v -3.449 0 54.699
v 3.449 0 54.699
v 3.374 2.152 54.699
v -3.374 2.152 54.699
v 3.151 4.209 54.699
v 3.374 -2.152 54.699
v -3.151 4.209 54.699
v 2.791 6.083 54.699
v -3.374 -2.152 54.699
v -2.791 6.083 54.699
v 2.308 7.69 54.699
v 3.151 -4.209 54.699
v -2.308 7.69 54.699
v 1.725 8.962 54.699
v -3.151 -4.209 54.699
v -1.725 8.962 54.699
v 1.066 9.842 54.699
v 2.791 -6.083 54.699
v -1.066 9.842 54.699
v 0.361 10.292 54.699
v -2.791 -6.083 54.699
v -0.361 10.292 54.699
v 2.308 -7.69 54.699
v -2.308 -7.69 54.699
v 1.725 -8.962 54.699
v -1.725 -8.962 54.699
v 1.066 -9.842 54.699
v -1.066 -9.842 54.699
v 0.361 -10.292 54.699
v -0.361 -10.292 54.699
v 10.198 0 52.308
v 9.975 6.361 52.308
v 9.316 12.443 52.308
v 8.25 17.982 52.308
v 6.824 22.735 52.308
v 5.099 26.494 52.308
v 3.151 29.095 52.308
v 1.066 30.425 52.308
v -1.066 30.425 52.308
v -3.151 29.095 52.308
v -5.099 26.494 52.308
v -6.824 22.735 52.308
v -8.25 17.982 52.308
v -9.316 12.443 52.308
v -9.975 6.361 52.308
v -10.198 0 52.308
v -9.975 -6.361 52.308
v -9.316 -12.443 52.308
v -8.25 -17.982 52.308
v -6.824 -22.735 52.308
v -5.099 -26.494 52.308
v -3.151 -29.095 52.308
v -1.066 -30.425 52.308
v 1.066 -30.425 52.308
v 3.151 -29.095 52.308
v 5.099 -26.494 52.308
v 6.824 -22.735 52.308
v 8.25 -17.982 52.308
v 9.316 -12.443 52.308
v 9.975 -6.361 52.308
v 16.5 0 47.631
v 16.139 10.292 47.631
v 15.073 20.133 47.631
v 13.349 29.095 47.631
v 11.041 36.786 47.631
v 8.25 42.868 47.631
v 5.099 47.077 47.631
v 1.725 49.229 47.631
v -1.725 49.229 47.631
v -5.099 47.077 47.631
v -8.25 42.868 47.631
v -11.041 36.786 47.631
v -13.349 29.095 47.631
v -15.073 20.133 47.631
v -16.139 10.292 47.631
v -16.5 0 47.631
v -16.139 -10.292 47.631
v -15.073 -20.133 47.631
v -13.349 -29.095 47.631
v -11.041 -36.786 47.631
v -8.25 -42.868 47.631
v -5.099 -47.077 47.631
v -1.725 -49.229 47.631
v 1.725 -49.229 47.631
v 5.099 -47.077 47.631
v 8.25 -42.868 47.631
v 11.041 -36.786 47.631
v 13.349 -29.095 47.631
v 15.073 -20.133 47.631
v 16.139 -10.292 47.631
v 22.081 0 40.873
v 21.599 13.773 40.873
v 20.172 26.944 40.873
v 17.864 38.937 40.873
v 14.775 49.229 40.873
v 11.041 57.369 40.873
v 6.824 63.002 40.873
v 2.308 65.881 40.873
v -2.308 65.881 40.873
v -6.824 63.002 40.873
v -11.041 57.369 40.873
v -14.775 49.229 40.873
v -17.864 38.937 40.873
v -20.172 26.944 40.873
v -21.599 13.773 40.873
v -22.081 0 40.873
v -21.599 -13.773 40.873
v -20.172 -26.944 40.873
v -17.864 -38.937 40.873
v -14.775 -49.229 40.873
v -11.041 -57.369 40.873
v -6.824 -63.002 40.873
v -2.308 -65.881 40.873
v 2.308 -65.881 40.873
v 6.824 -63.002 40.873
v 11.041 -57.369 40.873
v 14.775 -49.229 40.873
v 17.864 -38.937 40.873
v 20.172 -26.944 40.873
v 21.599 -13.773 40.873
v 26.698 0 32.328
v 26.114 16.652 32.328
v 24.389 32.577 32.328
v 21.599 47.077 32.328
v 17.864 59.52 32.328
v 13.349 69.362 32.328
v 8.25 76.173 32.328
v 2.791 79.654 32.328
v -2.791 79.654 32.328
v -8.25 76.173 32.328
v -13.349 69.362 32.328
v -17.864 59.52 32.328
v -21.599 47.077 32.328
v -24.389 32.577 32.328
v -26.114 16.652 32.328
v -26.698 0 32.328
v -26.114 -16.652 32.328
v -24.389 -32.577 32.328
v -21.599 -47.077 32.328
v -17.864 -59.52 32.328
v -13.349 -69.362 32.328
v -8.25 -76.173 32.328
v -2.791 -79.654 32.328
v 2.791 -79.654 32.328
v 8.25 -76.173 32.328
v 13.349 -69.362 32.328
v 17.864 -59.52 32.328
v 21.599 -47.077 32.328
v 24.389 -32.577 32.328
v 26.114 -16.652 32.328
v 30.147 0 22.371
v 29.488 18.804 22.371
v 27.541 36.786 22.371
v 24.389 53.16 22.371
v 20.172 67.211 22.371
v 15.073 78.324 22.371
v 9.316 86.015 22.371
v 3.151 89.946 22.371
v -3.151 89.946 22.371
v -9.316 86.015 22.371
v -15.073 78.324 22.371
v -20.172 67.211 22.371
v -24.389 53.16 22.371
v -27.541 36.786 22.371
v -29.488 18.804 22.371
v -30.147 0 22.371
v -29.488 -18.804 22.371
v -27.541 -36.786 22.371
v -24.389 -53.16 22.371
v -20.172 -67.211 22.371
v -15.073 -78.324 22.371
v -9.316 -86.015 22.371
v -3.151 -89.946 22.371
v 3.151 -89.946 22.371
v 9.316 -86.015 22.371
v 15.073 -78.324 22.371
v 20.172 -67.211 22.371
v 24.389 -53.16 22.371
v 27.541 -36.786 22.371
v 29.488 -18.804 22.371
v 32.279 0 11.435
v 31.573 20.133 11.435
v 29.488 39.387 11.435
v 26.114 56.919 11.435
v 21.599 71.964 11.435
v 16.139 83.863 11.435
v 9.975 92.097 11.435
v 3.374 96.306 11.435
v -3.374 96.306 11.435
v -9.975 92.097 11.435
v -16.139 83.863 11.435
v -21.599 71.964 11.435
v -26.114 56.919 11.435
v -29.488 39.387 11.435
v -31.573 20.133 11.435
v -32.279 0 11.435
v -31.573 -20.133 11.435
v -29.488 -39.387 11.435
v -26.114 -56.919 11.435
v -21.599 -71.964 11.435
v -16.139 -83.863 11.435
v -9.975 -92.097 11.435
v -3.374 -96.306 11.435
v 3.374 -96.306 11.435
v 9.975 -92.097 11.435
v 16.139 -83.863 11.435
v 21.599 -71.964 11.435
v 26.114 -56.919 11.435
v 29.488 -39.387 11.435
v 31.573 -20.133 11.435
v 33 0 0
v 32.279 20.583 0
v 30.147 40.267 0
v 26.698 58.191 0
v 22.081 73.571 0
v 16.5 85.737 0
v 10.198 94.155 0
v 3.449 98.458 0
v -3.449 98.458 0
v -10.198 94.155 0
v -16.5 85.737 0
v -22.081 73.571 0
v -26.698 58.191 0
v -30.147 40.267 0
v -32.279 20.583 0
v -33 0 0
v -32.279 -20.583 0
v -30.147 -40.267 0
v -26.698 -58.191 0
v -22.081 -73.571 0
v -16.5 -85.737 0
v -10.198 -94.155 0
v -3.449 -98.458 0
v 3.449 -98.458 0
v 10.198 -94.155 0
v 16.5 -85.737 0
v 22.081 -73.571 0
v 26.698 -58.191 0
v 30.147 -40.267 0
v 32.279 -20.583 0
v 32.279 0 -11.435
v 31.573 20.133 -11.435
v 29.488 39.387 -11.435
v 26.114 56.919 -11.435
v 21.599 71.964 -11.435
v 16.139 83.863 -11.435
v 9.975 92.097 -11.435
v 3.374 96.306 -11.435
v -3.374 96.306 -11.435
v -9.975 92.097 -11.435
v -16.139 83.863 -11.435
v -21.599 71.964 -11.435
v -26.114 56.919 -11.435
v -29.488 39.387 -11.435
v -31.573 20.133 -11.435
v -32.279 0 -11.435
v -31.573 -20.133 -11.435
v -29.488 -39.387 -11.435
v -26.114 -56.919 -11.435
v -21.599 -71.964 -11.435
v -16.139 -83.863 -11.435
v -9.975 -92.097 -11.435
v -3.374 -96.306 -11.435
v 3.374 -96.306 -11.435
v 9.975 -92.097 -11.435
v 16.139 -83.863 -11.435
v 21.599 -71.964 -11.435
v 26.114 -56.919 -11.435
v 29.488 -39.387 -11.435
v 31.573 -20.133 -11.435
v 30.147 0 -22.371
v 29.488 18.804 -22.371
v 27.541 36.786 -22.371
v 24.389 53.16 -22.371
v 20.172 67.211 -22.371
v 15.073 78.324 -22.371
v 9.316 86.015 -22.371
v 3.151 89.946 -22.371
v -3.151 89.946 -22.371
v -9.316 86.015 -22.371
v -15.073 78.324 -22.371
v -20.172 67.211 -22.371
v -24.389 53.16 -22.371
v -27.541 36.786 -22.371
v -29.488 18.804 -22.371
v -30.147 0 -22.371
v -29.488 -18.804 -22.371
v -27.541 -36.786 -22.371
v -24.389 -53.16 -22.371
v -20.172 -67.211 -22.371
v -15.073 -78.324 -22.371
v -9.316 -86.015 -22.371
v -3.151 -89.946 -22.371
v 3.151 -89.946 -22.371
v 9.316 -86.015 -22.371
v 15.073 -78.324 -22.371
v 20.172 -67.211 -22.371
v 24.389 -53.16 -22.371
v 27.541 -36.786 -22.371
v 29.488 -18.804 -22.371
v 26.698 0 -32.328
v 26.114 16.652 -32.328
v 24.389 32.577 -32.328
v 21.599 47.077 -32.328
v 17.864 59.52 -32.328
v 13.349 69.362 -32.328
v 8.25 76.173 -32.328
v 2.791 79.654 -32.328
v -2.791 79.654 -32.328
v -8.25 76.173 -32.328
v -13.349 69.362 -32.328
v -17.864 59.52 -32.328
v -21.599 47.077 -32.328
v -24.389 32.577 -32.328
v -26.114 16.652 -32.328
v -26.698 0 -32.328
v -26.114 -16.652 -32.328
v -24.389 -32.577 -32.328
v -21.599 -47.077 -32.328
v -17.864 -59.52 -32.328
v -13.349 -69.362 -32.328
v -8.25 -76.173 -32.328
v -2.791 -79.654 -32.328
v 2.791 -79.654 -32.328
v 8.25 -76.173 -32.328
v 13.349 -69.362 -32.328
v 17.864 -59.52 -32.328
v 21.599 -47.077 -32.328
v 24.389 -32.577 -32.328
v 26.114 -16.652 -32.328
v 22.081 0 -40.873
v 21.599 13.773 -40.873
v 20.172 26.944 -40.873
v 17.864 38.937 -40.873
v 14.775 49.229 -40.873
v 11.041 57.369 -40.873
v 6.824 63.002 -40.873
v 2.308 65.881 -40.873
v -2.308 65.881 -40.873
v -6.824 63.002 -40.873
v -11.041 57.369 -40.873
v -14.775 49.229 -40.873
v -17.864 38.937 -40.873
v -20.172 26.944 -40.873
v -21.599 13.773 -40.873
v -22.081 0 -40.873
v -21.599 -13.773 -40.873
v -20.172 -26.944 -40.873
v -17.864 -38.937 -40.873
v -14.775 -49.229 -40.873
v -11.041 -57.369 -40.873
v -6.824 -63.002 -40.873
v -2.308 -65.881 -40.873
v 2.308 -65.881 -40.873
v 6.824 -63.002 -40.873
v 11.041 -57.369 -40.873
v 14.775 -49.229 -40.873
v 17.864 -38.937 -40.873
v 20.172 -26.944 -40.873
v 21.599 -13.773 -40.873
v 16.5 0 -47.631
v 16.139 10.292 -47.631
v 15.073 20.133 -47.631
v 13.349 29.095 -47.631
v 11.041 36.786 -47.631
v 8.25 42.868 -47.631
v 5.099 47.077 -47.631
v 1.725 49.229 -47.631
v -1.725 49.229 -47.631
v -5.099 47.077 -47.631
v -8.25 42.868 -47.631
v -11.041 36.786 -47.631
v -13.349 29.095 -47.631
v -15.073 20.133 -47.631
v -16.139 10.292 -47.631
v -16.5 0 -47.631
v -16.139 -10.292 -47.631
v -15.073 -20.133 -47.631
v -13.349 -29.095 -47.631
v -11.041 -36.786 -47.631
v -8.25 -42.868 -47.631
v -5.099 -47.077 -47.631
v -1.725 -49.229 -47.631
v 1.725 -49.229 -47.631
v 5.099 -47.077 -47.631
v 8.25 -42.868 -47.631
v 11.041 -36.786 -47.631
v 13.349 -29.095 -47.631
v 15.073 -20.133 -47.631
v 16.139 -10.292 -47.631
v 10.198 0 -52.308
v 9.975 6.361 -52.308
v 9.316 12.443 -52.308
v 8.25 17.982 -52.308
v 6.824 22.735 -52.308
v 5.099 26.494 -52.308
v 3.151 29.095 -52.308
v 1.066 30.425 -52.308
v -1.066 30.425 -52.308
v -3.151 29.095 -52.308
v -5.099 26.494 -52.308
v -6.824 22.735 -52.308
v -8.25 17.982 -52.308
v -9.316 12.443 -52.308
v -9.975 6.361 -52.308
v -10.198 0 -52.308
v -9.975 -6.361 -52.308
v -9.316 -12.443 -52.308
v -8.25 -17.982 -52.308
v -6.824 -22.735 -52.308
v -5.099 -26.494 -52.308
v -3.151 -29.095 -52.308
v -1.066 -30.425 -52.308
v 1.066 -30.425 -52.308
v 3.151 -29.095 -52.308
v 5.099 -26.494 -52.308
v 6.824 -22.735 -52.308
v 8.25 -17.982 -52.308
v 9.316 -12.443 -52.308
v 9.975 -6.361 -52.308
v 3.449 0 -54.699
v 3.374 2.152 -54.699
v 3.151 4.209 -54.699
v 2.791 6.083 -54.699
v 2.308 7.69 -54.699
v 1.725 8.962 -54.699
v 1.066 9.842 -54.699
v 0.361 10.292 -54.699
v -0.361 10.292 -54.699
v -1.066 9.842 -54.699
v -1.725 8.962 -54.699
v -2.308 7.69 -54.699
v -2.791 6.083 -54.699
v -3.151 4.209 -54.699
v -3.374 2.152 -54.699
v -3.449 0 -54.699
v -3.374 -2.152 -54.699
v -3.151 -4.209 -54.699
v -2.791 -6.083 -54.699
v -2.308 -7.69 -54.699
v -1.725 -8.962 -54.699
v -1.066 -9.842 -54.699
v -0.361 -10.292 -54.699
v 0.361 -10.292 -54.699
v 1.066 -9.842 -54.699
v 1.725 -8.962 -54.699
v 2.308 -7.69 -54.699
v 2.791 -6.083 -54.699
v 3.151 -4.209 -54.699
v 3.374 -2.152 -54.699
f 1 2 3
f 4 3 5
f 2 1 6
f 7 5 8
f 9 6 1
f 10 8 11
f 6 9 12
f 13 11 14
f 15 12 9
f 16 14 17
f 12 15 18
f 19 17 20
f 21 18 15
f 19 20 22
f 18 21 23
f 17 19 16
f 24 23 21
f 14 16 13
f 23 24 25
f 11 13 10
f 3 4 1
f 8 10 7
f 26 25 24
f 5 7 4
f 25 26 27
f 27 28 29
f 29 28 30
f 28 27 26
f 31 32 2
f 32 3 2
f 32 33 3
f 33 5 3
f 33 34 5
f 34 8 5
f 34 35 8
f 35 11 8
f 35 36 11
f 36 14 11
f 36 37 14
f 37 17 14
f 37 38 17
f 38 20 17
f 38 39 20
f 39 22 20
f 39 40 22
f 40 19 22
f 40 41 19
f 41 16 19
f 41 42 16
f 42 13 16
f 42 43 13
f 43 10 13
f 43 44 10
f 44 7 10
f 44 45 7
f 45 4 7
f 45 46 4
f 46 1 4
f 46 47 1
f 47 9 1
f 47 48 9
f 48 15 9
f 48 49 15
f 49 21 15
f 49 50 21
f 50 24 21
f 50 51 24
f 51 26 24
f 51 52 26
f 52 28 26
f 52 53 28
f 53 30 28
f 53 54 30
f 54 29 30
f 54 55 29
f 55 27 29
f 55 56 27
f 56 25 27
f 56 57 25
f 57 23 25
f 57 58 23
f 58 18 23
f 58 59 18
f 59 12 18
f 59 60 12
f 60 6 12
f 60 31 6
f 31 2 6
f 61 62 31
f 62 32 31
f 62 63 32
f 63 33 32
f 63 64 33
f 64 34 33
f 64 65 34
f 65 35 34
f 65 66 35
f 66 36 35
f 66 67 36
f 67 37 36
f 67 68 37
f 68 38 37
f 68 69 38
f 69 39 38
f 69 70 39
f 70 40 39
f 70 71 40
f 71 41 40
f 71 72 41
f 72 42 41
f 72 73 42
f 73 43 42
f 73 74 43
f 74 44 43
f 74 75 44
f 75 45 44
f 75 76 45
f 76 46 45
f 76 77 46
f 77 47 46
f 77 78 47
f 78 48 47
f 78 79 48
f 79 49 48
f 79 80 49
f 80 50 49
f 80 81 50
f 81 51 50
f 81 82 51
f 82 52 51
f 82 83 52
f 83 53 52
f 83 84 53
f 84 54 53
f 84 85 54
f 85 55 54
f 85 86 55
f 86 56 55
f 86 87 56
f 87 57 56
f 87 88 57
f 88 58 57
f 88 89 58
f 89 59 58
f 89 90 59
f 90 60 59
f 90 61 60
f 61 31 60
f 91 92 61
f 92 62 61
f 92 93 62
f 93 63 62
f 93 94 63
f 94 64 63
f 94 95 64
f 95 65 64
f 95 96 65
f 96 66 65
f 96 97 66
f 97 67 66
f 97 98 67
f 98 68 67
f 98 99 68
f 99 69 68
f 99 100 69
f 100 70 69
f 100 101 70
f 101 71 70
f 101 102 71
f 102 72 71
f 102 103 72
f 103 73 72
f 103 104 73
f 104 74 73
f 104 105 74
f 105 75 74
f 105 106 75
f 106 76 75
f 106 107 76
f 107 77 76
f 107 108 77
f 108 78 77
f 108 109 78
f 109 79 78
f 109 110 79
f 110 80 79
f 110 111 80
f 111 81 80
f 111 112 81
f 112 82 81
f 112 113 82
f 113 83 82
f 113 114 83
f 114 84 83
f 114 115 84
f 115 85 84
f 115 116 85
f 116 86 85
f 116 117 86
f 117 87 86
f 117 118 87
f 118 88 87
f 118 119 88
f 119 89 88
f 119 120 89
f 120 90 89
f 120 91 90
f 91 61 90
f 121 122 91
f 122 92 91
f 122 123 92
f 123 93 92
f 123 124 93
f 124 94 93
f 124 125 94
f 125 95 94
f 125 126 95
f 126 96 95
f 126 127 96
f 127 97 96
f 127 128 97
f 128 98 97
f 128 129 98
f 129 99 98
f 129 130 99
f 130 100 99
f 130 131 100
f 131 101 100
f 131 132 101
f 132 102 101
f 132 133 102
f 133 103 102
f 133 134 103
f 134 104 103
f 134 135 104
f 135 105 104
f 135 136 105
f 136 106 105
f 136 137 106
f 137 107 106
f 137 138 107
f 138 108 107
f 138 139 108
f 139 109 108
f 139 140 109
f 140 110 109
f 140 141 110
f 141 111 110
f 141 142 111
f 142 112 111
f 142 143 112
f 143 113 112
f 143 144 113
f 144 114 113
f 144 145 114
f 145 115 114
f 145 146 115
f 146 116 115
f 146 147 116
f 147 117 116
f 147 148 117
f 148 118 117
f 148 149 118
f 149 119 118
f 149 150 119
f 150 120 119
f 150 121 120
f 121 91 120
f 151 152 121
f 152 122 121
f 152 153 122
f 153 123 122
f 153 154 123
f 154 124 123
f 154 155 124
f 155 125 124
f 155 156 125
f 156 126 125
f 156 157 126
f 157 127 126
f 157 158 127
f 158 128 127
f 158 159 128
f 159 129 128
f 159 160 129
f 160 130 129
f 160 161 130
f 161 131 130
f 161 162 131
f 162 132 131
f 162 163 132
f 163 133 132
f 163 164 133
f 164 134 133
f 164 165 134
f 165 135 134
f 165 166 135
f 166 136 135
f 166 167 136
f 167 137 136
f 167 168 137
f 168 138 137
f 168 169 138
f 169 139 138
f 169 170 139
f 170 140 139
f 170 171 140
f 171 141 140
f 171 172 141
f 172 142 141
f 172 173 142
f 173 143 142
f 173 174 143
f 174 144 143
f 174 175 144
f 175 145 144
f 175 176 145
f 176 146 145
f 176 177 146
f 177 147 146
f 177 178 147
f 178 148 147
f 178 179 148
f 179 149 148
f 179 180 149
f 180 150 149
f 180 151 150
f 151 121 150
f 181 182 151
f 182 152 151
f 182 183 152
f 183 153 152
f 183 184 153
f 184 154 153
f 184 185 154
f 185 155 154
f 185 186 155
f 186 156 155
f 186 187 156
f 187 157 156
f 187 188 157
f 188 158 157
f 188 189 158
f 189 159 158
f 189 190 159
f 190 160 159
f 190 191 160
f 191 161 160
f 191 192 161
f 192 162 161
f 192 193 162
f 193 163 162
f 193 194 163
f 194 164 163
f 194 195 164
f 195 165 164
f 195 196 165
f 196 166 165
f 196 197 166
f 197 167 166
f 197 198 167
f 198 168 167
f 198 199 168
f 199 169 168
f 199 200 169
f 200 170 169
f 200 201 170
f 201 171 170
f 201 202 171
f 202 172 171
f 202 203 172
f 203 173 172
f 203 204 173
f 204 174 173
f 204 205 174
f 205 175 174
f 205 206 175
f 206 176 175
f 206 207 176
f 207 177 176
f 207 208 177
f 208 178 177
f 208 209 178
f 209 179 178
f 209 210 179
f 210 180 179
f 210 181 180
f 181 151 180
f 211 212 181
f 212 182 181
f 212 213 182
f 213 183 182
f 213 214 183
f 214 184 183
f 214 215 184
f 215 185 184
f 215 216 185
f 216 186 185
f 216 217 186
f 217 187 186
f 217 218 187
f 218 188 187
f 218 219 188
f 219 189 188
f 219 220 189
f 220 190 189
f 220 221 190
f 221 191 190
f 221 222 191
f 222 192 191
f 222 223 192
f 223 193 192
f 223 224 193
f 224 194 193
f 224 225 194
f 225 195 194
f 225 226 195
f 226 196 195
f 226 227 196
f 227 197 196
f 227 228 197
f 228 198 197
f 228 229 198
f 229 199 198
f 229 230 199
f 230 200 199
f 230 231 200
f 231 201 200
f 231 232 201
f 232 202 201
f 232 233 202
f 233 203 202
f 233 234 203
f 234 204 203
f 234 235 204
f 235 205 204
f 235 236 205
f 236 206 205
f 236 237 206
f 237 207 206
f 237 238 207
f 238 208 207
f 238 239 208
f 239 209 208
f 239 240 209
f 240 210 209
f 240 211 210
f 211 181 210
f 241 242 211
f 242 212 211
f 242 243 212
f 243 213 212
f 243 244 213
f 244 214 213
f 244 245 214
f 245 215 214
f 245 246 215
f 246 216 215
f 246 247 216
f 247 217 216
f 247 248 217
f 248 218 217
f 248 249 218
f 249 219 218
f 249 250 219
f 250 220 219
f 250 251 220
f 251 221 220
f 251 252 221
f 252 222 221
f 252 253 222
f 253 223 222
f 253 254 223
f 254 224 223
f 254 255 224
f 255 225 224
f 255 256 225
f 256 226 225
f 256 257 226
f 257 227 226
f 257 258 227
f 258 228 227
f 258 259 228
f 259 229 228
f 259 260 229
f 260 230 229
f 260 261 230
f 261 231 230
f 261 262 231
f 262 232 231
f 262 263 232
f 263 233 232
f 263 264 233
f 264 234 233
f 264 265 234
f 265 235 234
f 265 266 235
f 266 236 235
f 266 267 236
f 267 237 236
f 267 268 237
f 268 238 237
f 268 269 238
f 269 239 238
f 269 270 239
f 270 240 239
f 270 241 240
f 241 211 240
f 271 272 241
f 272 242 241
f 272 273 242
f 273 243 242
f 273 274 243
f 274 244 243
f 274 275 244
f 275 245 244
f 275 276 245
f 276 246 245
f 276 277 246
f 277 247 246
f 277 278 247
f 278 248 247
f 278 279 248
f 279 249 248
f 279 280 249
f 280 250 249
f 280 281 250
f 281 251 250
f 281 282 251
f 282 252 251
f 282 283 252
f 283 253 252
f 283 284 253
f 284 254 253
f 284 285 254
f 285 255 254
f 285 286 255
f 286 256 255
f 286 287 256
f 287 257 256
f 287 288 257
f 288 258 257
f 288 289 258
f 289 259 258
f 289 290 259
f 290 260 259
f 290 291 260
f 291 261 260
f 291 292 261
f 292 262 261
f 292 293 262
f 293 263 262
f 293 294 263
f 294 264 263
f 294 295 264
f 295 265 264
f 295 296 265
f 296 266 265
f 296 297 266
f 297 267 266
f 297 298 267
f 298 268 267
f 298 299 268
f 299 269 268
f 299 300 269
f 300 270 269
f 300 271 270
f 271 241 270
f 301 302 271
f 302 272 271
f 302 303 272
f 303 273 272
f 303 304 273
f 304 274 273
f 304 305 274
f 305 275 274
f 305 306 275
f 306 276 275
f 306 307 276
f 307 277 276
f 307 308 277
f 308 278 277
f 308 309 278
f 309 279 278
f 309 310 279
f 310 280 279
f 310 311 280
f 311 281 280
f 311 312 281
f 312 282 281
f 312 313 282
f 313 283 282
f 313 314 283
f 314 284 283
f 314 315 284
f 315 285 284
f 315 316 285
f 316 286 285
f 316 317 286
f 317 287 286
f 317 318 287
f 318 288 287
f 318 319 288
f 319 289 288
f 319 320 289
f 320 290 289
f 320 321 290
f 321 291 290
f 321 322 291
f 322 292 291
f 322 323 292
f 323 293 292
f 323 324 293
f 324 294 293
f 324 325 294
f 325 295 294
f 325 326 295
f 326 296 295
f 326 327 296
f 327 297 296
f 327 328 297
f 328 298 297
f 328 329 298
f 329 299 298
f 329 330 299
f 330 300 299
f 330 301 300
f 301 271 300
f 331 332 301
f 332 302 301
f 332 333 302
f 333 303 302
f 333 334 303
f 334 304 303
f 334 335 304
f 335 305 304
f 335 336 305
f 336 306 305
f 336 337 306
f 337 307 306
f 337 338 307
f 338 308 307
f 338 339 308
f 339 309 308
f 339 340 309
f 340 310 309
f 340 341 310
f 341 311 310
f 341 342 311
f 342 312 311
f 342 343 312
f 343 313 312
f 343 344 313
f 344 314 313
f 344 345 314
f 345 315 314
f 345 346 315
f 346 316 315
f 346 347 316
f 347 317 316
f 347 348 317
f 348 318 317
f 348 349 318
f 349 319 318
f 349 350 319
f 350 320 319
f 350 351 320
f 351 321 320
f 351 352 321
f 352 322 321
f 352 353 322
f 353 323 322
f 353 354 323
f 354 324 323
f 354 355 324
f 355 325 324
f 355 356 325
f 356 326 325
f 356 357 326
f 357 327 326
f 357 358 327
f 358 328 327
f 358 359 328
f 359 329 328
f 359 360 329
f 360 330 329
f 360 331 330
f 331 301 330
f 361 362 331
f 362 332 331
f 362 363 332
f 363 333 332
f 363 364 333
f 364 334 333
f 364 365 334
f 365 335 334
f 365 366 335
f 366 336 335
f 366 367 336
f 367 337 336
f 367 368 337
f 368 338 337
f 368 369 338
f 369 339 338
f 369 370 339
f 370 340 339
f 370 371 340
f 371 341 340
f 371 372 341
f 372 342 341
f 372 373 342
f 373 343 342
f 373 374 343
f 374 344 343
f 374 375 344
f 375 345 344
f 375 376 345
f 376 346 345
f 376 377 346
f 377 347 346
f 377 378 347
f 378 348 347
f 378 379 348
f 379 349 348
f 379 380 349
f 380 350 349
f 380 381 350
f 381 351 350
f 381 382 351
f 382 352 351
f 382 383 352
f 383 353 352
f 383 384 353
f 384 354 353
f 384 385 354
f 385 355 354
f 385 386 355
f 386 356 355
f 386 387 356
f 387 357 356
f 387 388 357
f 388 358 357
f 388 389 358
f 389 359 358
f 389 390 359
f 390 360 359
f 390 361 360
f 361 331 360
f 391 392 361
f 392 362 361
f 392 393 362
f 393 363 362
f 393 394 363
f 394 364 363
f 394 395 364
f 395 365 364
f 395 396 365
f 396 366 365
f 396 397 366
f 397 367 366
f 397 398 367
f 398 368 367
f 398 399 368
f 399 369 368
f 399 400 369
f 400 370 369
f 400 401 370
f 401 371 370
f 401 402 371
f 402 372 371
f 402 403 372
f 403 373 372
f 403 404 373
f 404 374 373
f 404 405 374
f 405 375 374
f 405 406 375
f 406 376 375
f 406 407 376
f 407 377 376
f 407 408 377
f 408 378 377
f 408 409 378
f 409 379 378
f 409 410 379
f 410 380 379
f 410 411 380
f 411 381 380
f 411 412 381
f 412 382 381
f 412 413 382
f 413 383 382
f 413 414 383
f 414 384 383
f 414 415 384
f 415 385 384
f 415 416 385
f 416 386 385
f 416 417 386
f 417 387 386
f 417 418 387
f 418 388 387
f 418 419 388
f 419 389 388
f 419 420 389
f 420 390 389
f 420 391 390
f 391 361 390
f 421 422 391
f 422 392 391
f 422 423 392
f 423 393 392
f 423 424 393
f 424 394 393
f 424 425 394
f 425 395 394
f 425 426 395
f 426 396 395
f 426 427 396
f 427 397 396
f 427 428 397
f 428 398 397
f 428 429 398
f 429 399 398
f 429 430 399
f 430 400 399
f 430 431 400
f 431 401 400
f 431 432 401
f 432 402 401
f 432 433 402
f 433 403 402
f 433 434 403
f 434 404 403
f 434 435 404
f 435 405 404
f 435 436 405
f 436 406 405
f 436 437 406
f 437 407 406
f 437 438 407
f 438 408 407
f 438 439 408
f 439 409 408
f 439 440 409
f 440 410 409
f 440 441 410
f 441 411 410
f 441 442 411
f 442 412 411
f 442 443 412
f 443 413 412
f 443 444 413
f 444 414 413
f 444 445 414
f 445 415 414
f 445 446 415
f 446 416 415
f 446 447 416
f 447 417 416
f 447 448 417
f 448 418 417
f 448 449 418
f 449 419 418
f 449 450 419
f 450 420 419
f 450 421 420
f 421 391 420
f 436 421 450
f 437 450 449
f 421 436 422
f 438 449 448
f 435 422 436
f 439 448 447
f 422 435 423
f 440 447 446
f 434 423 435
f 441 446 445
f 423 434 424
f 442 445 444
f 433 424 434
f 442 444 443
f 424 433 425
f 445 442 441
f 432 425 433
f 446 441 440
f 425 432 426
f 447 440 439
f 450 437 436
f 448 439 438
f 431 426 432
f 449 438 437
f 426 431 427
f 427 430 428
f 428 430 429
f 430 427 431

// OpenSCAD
// Generated by SolidPython 1.0.1 on 2020-07-29 00:46:45


scale(v = [3, 9, 5]) {
	sphere(r = 11);
}
/***********************************************
*********      SolidPython code:      **********
************************************************
 
# import packages: SolidPython
from solid import *
from solid.utils import *
from itertools import chain, combinations, permutations


class Resize:

    def __init__(self, scad_file):
        self.scad_file = scad_file
        #self.scad_file = import_scad(scad_file)
        # cone/cylinder param:
        self.r1 = 0
        self.r2 = 0
        self.h = 0
        # rectangular prism param:
        self.w = 0
        self.l = 0
        # ellipse param:
        self.r = 0

    # import OpenScad code (file name corresponds to shape)


    # classify shape + parameters
    def assign(self, param1, param2, param3):
        if self.scad_file == 'cone.scad':
            self.r1 = param1
            self.r2 = param2
            self.h = param3
        elif self.scad_file == 'cylinder.scad':
            self.r1 = param1
            self.r2 = param2
            self.h = param3
        elif self.scad_file == 'rectangularPrism.scad':
            self.h = param1
            self.l = param2
            self.w = param3
        else:
            self.r = param1
            self.h = param2

    # resize parameters
    def iterate(self):
        x = range(3, 20, 2)
        i = 1
        if self.scad_file == 'cone.scad':
            tempList = list(permutations(x, 2))
            for temp in tempList:
                param1 = temp[0]
                param2 = temp[1]
                filepath = 'produced_scad_files/' + 'cone' + str(param1) + '_' + str(param2) + '_' + '.scad'
                scad_render_to_file(cylinder(h=param1, r1=param2, r2=0), filepath)

        elif self.scad_file == 'cylinder.scad':
            tempList = list(permutations(x, 3))
            for temp in tempList:
                param1 = temp[0]
                param2 = temp[1]
                filepath = 'produced_scad_files/' + 'cylinder' + str(param1) + '_' + str(param2) + '_' + '.scad'
                scad_render_to_file(cylinder(h=param1, r1=param2, r2=param2), filepath)

        elif self.scad_file == 'rectangularPrism.scad':
            tempList = list(permutations(x, 3))
            for temp in tempList:
                param1 = temp[0]
                param2 = temp[1]
                param3 = temp[2]
                filepath = 'produced_scad_files/' + 'rectangularPrism' + str(param1) + '_' + str(param2) + '_' + str(
                    param3) + '.scad'
                scad_render_to_file(cube(size=(param1, param2, param3)), filepath)

        elif self.scad_file == 'ellipse.scad':
            tempList = list(permutations(x, 4))
            for temp in tempList:
                param1 = temp[0]
                param2 = temp[1]
                param3 = temp[2]
                param4 = temp[3]
                filepath = 'produced_scad_files/' + 'ellipse' + str(param1) + '_' + str(param2) + '_' + str(param3) + '_' + str(param4) + '.scad'
                scad_render_to_file(scale([param1, param2, param3])(sphere(r=param4)), filepath)

    def render_to_scadfile(self):
        scad_render_to_file(scad, 'example.scad') 
 
************************************************/
